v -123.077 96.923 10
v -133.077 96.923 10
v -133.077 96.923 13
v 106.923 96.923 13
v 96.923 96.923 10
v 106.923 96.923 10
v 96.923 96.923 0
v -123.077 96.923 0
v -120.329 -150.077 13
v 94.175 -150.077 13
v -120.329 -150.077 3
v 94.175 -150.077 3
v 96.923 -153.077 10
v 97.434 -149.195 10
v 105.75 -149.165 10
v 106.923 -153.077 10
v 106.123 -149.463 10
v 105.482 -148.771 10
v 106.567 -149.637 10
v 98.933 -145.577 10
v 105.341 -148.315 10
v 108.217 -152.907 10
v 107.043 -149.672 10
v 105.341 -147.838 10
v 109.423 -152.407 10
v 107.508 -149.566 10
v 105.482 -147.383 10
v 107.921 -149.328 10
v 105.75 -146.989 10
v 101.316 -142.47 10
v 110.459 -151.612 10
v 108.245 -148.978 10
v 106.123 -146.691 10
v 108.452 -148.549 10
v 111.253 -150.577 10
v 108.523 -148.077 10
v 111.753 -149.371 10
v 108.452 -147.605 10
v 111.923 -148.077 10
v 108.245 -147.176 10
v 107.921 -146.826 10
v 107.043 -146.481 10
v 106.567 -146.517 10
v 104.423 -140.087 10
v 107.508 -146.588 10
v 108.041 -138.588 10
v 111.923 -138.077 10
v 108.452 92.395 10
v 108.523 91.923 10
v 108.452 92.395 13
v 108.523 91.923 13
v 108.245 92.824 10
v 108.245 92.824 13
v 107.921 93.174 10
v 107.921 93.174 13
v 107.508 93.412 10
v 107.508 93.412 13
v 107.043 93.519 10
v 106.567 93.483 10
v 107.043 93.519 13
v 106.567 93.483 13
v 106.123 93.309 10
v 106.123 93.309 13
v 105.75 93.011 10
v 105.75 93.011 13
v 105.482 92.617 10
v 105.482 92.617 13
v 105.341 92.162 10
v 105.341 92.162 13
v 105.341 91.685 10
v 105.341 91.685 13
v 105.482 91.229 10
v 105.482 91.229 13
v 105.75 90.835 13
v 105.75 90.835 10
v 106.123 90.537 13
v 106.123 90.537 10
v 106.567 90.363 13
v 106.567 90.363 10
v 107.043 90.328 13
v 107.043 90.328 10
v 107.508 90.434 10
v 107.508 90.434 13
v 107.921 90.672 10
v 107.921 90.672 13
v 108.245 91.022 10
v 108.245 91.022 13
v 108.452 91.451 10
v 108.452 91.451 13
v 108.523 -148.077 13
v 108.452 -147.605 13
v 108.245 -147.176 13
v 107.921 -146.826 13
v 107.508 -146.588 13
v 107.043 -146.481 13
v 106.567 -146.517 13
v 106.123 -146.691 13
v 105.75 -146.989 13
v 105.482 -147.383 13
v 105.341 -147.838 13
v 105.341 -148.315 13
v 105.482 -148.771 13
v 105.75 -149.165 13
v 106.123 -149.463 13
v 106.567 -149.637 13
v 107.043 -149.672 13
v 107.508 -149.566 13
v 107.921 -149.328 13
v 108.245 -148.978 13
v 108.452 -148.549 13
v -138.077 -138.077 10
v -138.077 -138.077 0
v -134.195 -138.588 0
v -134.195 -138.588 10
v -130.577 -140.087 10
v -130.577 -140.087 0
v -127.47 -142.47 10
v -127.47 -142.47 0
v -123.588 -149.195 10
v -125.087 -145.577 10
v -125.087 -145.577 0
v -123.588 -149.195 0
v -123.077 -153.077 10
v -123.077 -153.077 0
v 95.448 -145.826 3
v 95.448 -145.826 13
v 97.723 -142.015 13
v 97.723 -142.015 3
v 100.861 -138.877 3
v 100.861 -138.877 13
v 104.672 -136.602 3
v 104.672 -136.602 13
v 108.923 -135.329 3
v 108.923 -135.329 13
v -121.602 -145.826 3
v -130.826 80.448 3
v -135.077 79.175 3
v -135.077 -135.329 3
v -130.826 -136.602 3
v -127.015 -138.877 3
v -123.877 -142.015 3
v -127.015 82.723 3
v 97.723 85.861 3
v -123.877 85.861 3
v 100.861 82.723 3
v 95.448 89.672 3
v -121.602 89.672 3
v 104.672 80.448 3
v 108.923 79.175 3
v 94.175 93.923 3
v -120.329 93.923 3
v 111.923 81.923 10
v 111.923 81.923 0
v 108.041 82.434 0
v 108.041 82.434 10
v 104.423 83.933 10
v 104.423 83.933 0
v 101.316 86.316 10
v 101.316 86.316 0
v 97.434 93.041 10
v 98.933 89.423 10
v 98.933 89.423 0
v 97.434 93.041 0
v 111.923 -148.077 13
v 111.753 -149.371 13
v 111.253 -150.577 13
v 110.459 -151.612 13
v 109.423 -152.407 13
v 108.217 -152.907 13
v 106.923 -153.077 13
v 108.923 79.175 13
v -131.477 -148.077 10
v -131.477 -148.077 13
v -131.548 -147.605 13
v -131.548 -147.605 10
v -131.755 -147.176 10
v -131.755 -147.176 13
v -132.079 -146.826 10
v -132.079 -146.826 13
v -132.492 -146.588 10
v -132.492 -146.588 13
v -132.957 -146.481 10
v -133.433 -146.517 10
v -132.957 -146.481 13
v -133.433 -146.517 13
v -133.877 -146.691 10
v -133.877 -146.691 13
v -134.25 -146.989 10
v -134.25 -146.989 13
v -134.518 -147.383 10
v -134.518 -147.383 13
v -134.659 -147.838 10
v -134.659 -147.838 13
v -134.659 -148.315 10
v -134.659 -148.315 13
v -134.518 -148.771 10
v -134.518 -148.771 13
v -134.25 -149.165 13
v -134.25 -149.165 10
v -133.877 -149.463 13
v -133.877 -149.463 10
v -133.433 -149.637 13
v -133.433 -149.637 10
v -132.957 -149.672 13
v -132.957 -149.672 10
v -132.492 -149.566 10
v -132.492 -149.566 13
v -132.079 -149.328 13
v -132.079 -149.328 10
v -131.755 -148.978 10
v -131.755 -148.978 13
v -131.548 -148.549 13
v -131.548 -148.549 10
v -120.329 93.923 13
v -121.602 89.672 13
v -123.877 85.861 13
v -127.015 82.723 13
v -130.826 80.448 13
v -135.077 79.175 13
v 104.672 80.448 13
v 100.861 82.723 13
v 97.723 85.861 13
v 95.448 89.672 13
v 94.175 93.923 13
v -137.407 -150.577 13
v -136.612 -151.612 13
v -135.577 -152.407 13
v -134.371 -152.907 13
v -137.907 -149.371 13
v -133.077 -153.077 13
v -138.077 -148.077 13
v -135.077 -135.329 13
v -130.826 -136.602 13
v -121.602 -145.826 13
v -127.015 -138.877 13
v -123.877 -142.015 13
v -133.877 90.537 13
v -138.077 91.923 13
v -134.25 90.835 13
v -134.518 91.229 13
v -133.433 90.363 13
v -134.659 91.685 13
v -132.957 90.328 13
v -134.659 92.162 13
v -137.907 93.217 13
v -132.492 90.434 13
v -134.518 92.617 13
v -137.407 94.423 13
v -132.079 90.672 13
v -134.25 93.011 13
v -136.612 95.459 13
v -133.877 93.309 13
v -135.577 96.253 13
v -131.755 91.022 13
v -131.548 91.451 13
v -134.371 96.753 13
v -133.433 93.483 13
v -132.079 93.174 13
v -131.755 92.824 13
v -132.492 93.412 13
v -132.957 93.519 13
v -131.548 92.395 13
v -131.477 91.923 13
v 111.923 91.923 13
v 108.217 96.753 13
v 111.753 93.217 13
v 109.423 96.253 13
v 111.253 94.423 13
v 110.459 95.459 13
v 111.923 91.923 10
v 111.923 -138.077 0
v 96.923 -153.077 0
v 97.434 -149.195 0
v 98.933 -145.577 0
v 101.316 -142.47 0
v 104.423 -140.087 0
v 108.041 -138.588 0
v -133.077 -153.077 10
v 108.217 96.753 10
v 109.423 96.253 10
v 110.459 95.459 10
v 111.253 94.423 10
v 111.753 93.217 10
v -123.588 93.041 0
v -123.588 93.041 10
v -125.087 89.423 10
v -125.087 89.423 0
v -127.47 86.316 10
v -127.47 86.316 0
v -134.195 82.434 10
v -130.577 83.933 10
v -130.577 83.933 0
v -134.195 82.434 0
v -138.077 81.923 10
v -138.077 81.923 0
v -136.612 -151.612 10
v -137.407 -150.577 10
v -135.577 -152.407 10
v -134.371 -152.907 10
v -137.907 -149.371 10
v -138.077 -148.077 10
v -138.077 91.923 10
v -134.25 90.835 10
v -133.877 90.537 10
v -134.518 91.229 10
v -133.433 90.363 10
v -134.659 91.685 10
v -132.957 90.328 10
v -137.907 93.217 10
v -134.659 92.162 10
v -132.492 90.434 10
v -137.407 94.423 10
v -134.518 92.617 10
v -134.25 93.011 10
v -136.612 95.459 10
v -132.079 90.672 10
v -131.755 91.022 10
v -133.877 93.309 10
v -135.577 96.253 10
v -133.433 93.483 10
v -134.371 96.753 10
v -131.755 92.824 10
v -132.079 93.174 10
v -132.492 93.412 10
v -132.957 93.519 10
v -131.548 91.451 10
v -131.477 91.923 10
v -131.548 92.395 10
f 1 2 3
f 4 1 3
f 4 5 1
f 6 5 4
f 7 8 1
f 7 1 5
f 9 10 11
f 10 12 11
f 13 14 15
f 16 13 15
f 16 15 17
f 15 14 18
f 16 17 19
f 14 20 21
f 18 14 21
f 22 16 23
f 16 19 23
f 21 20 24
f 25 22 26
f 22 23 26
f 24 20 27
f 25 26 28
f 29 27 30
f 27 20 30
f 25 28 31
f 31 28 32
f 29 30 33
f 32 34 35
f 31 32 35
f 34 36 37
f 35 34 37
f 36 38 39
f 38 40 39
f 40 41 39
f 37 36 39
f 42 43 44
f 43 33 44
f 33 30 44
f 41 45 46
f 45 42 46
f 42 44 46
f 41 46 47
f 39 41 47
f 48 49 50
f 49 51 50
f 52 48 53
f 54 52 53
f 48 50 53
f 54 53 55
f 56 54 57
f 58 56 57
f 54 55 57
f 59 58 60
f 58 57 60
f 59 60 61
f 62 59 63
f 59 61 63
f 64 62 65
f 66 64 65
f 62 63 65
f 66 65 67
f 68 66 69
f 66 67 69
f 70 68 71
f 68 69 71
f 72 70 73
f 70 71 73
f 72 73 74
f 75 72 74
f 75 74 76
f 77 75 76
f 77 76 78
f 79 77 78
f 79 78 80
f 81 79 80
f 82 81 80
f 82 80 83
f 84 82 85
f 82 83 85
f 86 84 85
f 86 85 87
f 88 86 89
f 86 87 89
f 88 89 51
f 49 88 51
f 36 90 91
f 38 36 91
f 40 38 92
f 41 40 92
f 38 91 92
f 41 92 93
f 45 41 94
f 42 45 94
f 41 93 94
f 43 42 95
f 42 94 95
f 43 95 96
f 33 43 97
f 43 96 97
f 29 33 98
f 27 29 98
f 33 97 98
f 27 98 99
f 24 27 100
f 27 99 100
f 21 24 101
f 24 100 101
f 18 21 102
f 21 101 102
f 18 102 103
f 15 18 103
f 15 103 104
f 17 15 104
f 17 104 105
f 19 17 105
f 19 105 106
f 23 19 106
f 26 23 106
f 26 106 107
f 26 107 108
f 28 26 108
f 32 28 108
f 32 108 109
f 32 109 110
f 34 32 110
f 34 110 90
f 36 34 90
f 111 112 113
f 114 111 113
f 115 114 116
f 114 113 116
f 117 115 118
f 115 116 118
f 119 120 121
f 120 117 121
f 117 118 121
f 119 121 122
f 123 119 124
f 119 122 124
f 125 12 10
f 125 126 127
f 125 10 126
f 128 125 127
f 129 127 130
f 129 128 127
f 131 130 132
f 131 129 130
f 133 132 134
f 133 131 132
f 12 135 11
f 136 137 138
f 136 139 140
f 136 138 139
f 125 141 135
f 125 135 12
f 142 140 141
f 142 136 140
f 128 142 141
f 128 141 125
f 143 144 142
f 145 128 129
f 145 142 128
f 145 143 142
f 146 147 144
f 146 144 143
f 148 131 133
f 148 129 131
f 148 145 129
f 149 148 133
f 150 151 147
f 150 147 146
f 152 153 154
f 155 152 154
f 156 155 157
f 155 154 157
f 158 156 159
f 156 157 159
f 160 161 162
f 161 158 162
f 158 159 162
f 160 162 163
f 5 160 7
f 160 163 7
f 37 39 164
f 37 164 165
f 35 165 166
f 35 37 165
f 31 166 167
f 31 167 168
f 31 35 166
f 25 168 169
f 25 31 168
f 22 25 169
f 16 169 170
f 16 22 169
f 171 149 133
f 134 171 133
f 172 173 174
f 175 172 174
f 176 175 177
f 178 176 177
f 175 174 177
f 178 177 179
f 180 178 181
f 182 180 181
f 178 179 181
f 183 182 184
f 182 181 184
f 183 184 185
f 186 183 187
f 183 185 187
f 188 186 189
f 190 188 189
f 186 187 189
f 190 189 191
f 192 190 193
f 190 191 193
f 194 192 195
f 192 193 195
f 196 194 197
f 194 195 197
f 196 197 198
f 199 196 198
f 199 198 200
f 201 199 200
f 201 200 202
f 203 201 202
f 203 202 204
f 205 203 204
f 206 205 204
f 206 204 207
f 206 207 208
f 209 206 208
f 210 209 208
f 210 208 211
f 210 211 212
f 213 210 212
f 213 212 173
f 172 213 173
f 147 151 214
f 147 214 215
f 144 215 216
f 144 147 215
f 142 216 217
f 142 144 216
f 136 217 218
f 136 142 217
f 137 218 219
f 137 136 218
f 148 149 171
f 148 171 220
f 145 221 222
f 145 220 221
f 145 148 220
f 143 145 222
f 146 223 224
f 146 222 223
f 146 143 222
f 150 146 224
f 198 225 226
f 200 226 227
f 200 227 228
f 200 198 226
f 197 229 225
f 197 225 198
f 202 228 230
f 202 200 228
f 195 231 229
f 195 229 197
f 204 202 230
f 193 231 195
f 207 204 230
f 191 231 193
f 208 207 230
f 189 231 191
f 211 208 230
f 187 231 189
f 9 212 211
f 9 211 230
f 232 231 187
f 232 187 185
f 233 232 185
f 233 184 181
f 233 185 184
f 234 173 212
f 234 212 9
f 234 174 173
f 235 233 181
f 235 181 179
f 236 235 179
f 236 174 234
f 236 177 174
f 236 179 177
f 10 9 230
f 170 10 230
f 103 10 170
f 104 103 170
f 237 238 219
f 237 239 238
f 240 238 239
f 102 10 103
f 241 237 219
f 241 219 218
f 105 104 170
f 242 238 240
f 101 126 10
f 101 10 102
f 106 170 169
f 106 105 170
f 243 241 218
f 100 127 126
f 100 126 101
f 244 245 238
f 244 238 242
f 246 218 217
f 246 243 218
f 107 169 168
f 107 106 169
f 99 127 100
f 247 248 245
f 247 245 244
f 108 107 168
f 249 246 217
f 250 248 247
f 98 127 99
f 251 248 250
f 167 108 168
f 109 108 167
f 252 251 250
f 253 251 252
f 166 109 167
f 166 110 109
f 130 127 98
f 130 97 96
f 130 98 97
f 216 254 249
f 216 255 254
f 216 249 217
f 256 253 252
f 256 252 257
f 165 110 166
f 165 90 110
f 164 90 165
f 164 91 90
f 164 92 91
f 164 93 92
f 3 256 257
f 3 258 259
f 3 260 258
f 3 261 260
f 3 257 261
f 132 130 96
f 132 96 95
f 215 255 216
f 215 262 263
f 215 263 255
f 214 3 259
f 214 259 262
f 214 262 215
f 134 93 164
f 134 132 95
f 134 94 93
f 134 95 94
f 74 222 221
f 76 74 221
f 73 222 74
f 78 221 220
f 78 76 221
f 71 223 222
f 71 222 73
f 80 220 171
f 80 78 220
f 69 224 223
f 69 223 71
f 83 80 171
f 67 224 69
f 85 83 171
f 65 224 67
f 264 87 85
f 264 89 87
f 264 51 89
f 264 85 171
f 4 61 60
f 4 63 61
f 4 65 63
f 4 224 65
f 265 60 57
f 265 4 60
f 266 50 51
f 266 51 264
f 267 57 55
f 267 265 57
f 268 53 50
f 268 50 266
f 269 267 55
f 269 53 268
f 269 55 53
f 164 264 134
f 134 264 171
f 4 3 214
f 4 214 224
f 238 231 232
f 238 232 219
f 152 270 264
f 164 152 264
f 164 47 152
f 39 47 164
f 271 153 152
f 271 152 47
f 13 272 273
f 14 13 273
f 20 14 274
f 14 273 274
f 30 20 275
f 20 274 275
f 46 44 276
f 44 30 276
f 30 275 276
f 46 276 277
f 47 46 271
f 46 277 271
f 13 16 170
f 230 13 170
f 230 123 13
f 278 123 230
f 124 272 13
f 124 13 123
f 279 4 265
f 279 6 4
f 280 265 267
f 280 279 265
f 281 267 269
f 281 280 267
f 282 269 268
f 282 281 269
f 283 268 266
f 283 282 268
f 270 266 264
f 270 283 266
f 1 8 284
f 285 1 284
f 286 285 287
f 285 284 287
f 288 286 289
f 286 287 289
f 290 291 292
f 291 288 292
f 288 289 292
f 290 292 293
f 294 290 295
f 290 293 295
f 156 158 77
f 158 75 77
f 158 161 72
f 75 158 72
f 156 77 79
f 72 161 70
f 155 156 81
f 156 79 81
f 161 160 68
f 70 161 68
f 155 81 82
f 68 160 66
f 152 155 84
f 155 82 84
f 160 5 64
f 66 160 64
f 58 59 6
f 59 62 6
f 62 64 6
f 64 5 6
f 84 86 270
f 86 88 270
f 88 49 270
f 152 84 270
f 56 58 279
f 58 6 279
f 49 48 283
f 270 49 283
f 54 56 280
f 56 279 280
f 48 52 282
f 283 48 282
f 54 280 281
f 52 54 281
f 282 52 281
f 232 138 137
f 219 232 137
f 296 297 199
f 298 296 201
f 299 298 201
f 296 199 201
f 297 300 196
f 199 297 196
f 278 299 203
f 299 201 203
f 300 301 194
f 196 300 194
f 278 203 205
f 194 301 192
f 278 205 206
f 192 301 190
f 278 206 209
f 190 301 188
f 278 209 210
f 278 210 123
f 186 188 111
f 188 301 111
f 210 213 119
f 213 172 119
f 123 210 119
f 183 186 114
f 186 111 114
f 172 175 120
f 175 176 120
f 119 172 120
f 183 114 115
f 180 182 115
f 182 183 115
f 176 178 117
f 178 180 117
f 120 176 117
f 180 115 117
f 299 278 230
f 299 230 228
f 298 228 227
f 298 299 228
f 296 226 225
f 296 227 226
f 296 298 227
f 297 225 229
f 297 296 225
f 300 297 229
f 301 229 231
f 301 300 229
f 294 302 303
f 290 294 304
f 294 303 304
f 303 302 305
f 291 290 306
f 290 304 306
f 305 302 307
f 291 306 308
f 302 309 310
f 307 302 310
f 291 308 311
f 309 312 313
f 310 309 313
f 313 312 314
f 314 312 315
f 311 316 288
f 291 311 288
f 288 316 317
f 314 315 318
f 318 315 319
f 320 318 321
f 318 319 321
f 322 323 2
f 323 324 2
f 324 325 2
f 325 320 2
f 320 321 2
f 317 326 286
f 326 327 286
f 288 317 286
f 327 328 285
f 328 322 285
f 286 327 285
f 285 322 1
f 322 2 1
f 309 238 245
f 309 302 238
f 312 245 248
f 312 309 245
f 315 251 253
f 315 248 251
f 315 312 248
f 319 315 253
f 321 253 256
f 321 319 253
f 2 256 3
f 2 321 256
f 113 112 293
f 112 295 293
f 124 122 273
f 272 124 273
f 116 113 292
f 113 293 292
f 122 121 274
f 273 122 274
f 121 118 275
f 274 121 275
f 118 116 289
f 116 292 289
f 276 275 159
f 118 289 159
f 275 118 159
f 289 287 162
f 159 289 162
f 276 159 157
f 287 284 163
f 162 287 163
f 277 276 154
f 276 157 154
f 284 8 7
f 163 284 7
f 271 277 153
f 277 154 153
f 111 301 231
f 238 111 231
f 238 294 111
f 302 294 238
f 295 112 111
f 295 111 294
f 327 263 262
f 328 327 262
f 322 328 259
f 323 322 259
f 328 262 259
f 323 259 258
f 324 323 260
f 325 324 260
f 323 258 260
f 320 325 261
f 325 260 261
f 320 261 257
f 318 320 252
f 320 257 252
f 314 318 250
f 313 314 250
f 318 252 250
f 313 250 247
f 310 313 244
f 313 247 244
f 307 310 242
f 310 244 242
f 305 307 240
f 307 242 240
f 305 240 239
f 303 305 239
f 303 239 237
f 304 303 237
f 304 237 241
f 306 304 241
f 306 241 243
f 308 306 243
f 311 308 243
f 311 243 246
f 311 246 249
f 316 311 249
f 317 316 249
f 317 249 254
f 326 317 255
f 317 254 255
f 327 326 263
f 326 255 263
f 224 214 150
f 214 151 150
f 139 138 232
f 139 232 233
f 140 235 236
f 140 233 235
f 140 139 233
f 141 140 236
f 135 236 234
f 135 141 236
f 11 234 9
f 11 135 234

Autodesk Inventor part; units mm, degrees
ref_plane "YZ Plane" through (0, 0, 0) normal (1, 0, 0) x (0, 1, 0)
ref_plane "XZ Plane" through (0, 0, 0) normal (0, 1, 0) x (-1, 0, 0)
ref_plane "XY Plane" through (0, 0, 0) normal (0, 0, 1) x (1, 0, 0)
sketch "Sketch1" plane through (0, 0, 0) normal (0, 0, 1) x (1, 0, 0)
  line L0 (-123.0769, 96.9231) -> (96.9231, 96.9231)
  line L1 (111.9231, 81.9231) -> (111.9231, -138.0769)
  line L2 (96.9231, -153.0769) -> (-123.0769, -153.0769)
  line L3 (-138.0769, -138.0769) -> (-138.0769, 81.9231)
  arc A0 (-138.0769, 81.9231) -> (-123.0769, 96.9231) centre (-138.0769, 96.9231) ccw
  arc A1 (96.9231, 96.9231) -> (111.9231, 81.9231) centre (111.9231, 96.9231) ccw
  arc A2 (111.9231, -138.0769) -> (96.9231, -153.0769) centre (111.9231, -153.0769) ccw
  arc A3 (-123.0769, -153.0769) -> (-138.0769, -138.0769) centre (-138.0769, -153.0769) ccw
  point P0 (0, 0)
  dimension "d4" = 30
  dimension "d5" = 30
  dimension "d6" = 30
  dimension "d7" = 30
  dimension "d27" = 250
  dimension "d28" = 250
extrude "Extrusion1" add sketch "Sketch1" along normal blind 3
sketch "Sketch2" plane through (0, 0, 3) normal (0, 0, 1) x (1, 0, 0)
  line L0 (-123.0769, -153.0769) -> (96.9231, -153.0769) projected
  arc A0 (111.9231, -138.0769) -> (96.9231, -153.0769) centre (111.9231, -153.0769) ccw projected
  line L1 (111.9231, -138.0769) -> (111.9231, 81.9231) projected
  arc A1 (96.9231, 96.9231) -> (111.9231, 81.9231) centre (111.9231, 96.9231) ccw projected
  line L2 (96.9231, 96.9231) -> (-123.0769, 96.9231) projected
  arc A2 (-138.0769, 81.9231) -> (-123.0769, 96.9231) centre (-138.0769, 96.9231) ccw projected
  line L3 (-138.0769, 81.9231) -> (-138.0769, -138.0769) projected
  arc A3 (-123.0769, -153.0769) -> (-138.0769, -138.0769) centre (-138.0769, -153.0769) ccw projected
  line L4 (-120.3287, 93.9231) -> (94.1748, 93.9231)
  arc A4 (94.1748, 93.9231) -> (108.9231, 79.1748) centre (111.9231, 96.9231) ccw
  line L5 (108.9231, 79.1748) -> (108.9231, -135.3287)
  arc A5 (108.9231, -135.3287) -> (94.1748, -150.0769) centre (111.9231, -153.0769) ccw
  line L6 (94.1748, -150.0769) -> (-120.3287, -150.0769)
  arc A6 (-120.3287, -150.0769) -> (-135.0769, -135.3287) centre (-138.0769, -153.0769) ccw
  line L7 (-135.0769, -135.3287) -> (-135.0769, 79.1748)
  arc A7 (-135.0769, 79.1748) -> (-120.3287, 93.9231) centre (-138.0769, 96.9231) ccw
  point P0 (0, 0)
  dimension "d8" = 3
extrude "Extrusion2" add sketch "Sketch2" along normal blind 10
sketch "Sketch3" plane through (0, 0, 13) normal (0, 0, 1) x (1, 0, 0)
  line L0 (96.9231, 96.9231) -> (-123.0769, 96.9231) projected
  line L1 (-138.0769, 81.9231) -> (-138.0769, -138.0769) projected
  line L2 (111.9231, -138.0769) -> (111.9231, 81.9231) projected
  line L3 (-123.0769, -153.0769) -> (96.9231, -153.0769) projected
  arc A0 (111.9231, -138.0769) -> (96.9231, -153.0769) centre (111.9231, -153.0769) ccw projected
  arc A1 (-123.0769, -153.0769) -> (-138.0769, -138.0769) centre (-138.0769, -153.0769) ccw projected
  arc A2 (-138.0769, 81.9231) -> (-123.0769, 96.9231) centre (-138.0769, 96.9231) ccw projected
  arc A3 (96.9231, 96.9231) -> (111.9231, 81.9231) centre (111.9231, 96.9231) ccw projected
  line L4 (-138.0769, 96.9231) -> (111.9231, 96.9231)
  line L5 (111.9231, 96.9231) -> (111.9231, -153.0769)
  line L6 (111.9231, -153.0769) -> (-138.0769, -153.0769)
  line L7 (-138.0769, -153.0769) -> (-138.0769, 96.9231)
  point P0 (0, 0)
  point P1 (106.9231, 96.9231)
  point P2 (-133.0769, 86.9231)
  point P3 (116.9231, -143.0769)
  point P4 (111.9231, -138.0769)
  point P5 (-138.0769, -138.0769)
  point P6 (-123.0769, -153.0769)
  point P7 (-133.0769, 86.9231)
  point P8 (111.9231, 81.9231)
  point P9 (96.9231, 96.9231)
extrude "Extrusion3" add sketch "Sketch3" against normal blind 3 contours L4 L5 A3 | A2 L7 L4 | L5 L6 A0 | A1 L6 L7
fillet "Fillet1" radius 5 4 edges at (111.9231, -153.0769, 11.5) (-138.0769, -153.0769, 11.5) (111.9231, 96.9231, 11.5) (-138.0769, 96.9231, 11.5)
sketch "Sketch4" plane through (0, 0, 13) normal (0, 0, 1) x (1, 0, 0)
  arc A0 (-133.0769, 96.9231) -> (-138.0769, 91.9231) centre (-133.0769, 91.9231) ccw projected
  line L0 (-138.0769, 91.9231) -> (-138.0769, -148.0769) projected
  arc A1 (-138.0769, -148.0769) -> (-133.0769, -153.0769) centre (-133.0769, -148.0769) ccw projected
  line L1 (-133.0769, -153.0769) -> (106.9231, -153.0769) projected
  arc A2 (106.9231, -153.0769) -> (111.9231, -148.0769) centre (106.9231, -148.0769) ccw projected
  line L2 (111.9231, -148.0769) -> (111.9231, 91.9231) projected
  arc A3 (111.9231, 91.9231) -> (106.9231, 96.9231) centre (106.9231, 91.9231) ccw projected
  line L3 (106.9231, 96.9231) -> (-133.0769, 96.9231) projected
  line L4 (-120.3287, 93.9231) -> (94.1748, 93.9231) projected
  arc A4 (94.1748, 93.9231) -> (108.9231, 79.1748) centre (111.9231, 96.9231) ccw projected
  line L5 (108.9231, 79.1748) -> (108.9231, -135.3287) projected
  arc A5 (108.9231, -135.3287) -> (94.1748, -150.0769) centre (111.9231, -153.0769) ccw projected
  line L6 (94.1748, -150.0769) -> (-120.3287, -150.0769) projected
  arc A6 (-120.3287, -150.0769) -> (-135.0769, -135.3287) centre (-138.0769, -153.0769) ccw projected
  line L7 (-135.0769, -135.3287) -> (-135.0769, 79.1748) projected
  arc A7 (-135.0769, 79.1748) -> (-120.3287, 93.9231) centre (-138.0769, 96.9231) ccw projected
  circle A8 centre (-133.0769, 91.9231) radius 1.6
  circle A9 centre (-133.0769, -148.0769) radius 1.6
  circle A10 centre (106.9231, 91.9231) radius 1.6
  circle A11 centre (106.9231, -148.0769) radius 1.6
  point P0 (0, 0)
  dimension "d14" = 3.2
  dimension "d15" = 5
  dimension "d16" = 5
  dimension "d19" = 240
  dimension "d22" = 240
extrude "Extrusion4" cut sketch "Sketch4" against normal blind 3 contours A8 | A9 | A10 | A11
properties part number "Enclosure cover"
